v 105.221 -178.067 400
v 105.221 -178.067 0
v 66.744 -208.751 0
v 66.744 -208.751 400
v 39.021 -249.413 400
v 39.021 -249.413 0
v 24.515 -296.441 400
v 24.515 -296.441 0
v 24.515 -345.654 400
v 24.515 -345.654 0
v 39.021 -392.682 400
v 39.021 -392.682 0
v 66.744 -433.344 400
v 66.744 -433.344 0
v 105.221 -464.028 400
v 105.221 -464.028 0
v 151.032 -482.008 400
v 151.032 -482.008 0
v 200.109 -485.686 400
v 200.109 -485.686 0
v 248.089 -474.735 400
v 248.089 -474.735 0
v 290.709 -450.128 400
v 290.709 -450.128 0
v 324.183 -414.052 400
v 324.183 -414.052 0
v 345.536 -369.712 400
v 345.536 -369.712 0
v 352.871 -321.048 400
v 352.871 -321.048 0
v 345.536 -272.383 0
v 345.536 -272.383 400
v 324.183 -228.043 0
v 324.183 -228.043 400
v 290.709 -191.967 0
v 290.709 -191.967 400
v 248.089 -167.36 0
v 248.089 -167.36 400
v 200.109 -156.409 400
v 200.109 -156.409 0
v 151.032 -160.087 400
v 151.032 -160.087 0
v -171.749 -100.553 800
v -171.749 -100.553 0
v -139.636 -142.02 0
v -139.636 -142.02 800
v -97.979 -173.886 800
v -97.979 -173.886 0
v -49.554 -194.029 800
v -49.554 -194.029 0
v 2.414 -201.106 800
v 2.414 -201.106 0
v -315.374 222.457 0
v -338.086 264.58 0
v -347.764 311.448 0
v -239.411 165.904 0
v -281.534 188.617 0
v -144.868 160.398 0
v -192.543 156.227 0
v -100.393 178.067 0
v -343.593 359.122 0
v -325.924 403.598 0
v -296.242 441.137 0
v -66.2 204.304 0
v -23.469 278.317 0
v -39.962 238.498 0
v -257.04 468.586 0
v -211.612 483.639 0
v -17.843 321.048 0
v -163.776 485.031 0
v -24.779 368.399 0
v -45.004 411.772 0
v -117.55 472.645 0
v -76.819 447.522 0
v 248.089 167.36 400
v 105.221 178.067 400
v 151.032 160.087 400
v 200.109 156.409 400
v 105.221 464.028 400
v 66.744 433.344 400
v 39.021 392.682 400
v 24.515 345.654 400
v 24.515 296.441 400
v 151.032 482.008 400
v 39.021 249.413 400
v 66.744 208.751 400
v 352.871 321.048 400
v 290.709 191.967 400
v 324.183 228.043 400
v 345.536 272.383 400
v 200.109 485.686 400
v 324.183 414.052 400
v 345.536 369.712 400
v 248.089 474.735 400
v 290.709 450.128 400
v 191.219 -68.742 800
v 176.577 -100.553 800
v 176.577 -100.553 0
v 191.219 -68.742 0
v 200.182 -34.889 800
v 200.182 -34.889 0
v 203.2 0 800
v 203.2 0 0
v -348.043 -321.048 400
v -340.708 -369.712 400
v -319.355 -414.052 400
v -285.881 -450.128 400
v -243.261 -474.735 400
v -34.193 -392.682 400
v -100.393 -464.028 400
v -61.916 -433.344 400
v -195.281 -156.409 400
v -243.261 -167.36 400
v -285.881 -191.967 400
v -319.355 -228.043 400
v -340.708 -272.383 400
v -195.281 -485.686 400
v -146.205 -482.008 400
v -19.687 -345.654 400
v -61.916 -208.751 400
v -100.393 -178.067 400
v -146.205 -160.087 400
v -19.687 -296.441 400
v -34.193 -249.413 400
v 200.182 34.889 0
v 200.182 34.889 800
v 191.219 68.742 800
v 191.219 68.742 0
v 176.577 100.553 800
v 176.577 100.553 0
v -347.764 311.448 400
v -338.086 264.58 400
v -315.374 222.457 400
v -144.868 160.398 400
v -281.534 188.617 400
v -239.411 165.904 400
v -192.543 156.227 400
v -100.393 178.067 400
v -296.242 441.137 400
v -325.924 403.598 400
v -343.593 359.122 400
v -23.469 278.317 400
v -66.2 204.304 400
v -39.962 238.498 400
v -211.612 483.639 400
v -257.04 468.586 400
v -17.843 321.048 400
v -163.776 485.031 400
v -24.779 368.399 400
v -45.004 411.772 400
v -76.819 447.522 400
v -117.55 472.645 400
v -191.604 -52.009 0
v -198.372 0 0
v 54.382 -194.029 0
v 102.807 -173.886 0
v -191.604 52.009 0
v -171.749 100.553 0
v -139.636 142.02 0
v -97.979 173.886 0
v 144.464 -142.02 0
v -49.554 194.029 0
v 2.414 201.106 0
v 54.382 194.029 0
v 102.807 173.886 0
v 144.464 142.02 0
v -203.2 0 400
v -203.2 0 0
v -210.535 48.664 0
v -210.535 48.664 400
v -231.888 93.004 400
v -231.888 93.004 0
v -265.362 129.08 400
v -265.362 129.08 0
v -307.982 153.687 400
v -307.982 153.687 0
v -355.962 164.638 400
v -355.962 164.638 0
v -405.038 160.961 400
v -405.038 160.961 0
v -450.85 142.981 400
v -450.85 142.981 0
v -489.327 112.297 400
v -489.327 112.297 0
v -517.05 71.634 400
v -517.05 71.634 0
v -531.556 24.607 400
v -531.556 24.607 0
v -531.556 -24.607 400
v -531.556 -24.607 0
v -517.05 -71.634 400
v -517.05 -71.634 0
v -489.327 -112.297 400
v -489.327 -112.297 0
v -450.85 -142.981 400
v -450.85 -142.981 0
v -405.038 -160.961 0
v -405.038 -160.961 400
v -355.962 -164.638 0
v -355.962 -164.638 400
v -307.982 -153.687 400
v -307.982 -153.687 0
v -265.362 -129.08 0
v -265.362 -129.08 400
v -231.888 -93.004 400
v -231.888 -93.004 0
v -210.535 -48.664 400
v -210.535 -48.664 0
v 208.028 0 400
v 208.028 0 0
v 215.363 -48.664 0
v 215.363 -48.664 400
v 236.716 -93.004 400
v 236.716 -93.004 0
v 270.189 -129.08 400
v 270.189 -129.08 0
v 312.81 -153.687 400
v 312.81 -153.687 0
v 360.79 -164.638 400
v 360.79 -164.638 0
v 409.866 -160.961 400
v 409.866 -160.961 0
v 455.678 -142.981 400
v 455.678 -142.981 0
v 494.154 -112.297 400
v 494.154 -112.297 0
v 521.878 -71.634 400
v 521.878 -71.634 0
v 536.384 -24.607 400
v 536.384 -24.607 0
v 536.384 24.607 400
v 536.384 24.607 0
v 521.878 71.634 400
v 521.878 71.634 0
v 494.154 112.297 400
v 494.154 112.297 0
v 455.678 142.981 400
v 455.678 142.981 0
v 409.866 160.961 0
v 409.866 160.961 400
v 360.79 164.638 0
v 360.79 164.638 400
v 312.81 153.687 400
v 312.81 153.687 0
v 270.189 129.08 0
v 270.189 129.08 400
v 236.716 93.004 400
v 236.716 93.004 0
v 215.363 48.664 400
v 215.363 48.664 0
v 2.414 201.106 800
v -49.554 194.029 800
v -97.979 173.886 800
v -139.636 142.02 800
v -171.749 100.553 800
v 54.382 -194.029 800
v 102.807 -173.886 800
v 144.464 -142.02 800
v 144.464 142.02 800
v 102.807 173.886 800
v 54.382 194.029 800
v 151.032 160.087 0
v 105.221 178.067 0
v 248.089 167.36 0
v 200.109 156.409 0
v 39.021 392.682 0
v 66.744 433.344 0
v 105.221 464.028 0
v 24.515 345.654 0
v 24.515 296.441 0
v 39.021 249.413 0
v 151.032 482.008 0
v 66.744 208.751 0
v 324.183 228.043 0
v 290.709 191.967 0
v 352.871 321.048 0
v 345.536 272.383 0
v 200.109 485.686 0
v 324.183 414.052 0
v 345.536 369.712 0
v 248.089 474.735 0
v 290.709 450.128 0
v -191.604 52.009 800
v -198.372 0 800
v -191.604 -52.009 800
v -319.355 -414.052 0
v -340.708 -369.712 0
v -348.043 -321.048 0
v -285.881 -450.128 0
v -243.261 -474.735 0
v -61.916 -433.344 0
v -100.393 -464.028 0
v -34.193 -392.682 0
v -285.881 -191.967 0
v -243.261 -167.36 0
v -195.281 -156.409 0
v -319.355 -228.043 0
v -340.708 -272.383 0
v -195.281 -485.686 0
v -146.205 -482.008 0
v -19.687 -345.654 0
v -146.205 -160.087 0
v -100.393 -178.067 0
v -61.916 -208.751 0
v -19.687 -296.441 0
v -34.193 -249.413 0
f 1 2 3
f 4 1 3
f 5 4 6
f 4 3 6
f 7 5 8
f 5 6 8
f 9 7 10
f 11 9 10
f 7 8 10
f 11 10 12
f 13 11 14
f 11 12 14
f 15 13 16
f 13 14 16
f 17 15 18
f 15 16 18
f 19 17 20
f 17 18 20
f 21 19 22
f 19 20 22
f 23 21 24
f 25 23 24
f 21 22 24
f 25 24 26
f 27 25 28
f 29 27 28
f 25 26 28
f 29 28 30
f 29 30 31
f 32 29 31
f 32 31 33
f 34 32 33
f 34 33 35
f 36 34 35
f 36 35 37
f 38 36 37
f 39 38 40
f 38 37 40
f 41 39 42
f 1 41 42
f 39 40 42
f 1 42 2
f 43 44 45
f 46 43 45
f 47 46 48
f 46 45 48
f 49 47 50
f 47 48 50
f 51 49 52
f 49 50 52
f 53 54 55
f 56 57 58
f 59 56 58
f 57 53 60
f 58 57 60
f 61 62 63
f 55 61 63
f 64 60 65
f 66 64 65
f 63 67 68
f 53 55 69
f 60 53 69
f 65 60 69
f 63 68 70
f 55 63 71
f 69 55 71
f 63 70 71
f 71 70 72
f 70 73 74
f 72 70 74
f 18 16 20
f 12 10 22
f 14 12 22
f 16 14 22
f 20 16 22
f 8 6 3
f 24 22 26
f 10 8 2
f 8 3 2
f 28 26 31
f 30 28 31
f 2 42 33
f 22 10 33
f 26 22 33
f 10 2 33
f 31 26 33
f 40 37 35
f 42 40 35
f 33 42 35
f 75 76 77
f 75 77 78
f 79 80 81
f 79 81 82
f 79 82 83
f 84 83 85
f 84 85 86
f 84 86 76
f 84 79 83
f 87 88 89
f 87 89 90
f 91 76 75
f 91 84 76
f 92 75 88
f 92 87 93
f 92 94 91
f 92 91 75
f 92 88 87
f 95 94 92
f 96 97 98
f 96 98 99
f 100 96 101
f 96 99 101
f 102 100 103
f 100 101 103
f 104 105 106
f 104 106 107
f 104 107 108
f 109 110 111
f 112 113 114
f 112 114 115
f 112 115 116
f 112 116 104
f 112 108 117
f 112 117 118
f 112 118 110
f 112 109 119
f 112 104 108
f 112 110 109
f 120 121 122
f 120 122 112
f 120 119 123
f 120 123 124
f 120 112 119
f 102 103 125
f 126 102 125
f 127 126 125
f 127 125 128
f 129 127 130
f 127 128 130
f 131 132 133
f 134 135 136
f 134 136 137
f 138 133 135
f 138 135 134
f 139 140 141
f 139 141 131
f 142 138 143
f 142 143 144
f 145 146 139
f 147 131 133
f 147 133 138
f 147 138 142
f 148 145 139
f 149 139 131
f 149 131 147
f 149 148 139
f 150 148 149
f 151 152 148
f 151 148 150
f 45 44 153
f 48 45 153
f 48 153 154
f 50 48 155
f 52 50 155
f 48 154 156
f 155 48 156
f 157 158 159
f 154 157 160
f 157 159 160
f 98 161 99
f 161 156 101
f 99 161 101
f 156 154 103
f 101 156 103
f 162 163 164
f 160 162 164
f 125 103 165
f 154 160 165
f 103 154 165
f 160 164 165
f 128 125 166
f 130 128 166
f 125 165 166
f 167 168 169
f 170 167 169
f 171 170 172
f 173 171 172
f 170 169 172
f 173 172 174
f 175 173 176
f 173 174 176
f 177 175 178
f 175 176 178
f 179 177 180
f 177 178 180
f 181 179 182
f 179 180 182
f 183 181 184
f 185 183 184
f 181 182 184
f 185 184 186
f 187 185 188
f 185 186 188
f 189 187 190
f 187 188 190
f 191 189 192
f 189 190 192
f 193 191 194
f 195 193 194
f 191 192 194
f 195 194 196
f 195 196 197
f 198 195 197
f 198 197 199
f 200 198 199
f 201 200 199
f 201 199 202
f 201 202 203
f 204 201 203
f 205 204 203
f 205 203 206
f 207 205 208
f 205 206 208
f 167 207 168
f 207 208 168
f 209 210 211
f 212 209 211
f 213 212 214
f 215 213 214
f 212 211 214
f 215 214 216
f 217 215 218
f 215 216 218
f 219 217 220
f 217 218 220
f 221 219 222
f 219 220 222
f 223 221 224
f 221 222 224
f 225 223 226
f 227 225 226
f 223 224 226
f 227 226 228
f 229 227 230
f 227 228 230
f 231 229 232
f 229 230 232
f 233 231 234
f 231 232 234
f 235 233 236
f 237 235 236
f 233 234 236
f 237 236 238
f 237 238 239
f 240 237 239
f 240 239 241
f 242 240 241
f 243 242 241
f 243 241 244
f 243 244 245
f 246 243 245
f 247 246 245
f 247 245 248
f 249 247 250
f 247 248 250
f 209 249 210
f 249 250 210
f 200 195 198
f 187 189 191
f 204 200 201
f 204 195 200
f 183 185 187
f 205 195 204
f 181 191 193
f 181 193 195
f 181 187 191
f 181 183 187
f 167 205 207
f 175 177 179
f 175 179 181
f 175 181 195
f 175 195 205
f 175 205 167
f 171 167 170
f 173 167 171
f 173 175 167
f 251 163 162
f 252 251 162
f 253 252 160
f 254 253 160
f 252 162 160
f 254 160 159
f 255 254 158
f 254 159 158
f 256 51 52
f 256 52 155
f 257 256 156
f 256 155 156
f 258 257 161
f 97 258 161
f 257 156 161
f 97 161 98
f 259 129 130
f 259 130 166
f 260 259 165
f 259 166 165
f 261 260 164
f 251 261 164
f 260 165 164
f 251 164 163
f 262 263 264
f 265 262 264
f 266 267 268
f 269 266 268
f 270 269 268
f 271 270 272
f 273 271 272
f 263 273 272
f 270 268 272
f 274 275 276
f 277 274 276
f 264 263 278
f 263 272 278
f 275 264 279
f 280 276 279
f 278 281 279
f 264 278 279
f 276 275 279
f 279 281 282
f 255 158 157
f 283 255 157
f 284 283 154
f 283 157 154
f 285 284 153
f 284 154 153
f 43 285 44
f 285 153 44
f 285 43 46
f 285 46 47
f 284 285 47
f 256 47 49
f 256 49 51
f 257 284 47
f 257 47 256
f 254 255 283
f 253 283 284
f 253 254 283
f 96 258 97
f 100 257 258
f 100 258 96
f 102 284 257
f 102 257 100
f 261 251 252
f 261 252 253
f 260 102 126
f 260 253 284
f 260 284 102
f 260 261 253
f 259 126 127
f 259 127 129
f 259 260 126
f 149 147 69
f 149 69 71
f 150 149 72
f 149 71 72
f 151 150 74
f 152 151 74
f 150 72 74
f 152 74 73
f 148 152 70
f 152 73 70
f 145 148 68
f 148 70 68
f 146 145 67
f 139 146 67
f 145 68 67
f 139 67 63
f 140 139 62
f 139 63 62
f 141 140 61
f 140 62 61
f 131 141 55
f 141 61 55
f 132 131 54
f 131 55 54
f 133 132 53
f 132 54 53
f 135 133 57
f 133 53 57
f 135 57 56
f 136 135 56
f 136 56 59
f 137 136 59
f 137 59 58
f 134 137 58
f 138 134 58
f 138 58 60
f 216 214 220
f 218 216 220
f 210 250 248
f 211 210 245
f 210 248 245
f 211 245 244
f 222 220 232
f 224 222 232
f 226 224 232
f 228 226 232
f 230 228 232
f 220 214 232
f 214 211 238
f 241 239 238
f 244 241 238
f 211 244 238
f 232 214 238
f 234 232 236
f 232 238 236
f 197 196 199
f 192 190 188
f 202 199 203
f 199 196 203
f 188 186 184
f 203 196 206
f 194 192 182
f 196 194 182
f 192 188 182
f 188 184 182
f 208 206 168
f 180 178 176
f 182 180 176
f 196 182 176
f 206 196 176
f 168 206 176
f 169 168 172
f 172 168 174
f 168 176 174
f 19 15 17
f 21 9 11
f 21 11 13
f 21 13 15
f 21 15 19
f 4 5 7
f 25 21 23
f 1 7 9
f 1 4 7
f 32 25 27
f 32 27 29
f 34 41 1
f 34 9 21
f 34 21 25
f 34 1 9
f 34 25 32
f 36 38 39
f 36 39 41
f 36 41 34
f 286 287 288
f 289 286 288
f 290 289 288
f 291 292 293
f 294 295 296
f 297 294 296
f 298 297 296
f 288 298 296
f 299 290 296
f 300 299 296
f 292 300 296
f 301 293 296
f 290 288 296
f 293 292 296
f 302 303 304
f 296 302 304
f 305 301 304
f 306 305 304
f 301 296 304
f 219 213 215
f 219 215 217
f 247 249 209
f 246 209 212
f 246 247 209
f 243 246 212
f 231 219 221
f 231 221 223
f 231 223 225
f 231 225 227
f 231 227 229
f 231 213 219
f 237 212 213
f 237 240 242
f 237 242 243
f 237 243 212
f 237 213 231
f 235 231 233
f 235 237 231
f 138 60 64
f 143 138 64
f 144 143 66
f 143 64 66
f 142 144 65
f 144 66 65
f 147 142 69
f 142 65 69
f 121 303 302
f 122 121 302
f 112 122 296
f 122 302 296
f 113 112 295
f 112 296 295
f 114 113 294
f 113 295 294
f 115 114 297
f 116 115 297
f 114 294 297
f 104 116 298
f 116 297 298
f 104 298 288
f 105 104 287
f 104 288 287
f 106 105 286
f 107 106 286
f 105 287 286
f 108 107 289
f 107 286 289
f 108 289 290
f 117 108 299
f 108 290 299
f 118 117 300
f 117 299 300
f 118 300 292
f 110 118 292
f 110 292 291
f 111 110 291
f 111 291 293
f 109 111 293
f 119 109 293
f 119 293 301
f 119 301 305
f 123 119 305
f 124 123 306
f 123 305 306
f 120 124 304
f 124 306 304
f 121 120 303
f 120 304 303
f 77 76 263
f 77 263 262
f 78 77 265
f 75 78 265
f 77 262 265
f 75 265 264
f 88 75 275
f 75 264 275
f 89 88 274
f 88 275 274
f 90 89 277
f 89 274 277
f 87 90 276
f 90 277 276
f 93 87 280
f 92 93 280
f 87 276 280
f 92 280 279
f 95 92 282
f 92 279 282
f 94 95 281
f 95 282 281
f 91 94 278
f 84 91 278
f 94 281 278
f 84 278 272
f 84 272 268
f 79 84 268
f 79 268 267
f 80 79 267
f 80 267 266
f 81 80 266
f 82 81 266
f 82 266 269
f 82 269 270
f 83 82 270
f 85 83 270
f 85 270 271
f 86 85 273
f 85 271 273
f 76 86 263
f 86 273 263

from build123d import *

# Parameters (mm, degrees)
F1_DEPTH = 800
F0_R     = 165.1
F2_DEPTH = 400


with BuildPart() as f1:
    # F0 (on Top) → F1 (new body)
    with BuildSketch(Plane.XY):
        with BuildLine():
            ThreePointArc((176.5767080849, -100.5530017549), (196.431447435, -52.0089074926), (203.2, 0))
            ThreePointArc((203.2, 0), (196.431447435, 52.0089074926), (176.5767080849, 100.5530017549))
            ThreePointArc((176.5767080849, 100.5530017549), (102.8069000959, 173.8859497632), (2.4138001919, 201.1060035097))
            ThreePointArc((2.4138001919, 201.1060035097), (-97.9792997122, 173.8859497632), (-171.7491077011, 100.5530017549))
            ThreePointArc((-171.7491077011, 100.5530017549), (-198.3723996162, 0), (-171.7491077011, -100.5530017549))
            ThreePointArc((-171.7491077011, -100.5530017549), (-97.9792997122, -173.8859497632), (2.4138001919, -201.1060035097))
            ThreePointArc((2.4138001919, -201.1060035097), (102.8069000959, -173.8859497632), (176.5767080849, -100.5530017549))
        make_face()
    extrude(amount=F1_DEPTH)


with BuildPart() as f2:
    # F0 (on Top) → F2 (new body)
    with BuildSketch(Plane.XY):
        with Locations((-368.3, 0)):
            Circle(F0_R)
    extrude(amount=F2_DEPTH)


with BuildPart() as f2b:
    # F0 (on Top) → F2, piece 2 (new body)
    with BuildSketch(Plane.XY):
        with BuildLine():
            ThreePointArc((-17.8430999041, 321.0475684996), (-325.9238939328, 403.5975687353), (-100.3931003754, 178.0667740627))
            ThreePointArc((-100.3931003754, 178.0667740627), (-39.9623058753, 238.4975682639), (-17.8430999041, 321.0475684996))
        make_face()
    extrude(amount=F2_DEPTH)


with BuildPart() as f2c:
    # F0 (on Top) → F2, piece 3 (new body)
    with BuildSketch(Plane.XY):
        with BuildLine():
            ThreePointArc((352.8707002878, 321.0475684996), (105.2207002131, 464.0283626213), (105.2207004372, 178.0667742486))
            ThreePointArc((105.2207004372, 178.0667742486), (270.3207003625, 178.0667743779), (352.8707002878, 321.0475684996))
        make_face()
    extrude(amount=F2_DEPTH)


with BuildPart() as f2d:
    # F0 (on Top) → F2, piece 4 (new body)
    with BuildSketch(Plane.XY):
        with BuildLine():
            ThreePointArc((538.2276003838, 0), (373.1276003838, 165.1), (208.0276003838, 0))
            ThreePointArc((208.0276003838, 0), (373.1276003838, -165.1), (538.2276003838, 0))
        make_face()
    extrude(amount=F2_DEPTH)


with BuildPart() as f2e:
    # F0 (on Top) → F2, piece 5 (new body)
    with BuildSketch(Plane.XY):
        with BuildLine():
            ThreePointArc((352.8707002878, -321.0475684996), (270.3207004679, -178.0667744388), (105.2207006479, -178.0667741269))
            ThreePointArc((105.2207006479, -178.0667741269), (105.2207001078, -464.0283625605), (352.8707002878, -321.0475684996))
        make_face()
    extrude(amount=F2_DEPTH)


with BuildPart() as f2f:
    # F0 (on Top) → F2, piece 6 (new body)
    with BuildSketch(Plane.XY):
        with BuildLine():
            ThreePointArc((-17.8430999041, -321.0475684996), (-39.9623058151, -238.4975683682), (-100.3931001668, -178.0667741831))
            ThreePointArc((-100.3931001668, -178.0667741831), (-325.923893993, -403.597568631), (-17.8430999041, -321.0475684996))
        make_face()
    extrude(amount=F2_DEPTH)


solid = Compound([f1.part, f2.part, f2b.part, f2c.part, f2d.part, f2e.part, f2f.part])
